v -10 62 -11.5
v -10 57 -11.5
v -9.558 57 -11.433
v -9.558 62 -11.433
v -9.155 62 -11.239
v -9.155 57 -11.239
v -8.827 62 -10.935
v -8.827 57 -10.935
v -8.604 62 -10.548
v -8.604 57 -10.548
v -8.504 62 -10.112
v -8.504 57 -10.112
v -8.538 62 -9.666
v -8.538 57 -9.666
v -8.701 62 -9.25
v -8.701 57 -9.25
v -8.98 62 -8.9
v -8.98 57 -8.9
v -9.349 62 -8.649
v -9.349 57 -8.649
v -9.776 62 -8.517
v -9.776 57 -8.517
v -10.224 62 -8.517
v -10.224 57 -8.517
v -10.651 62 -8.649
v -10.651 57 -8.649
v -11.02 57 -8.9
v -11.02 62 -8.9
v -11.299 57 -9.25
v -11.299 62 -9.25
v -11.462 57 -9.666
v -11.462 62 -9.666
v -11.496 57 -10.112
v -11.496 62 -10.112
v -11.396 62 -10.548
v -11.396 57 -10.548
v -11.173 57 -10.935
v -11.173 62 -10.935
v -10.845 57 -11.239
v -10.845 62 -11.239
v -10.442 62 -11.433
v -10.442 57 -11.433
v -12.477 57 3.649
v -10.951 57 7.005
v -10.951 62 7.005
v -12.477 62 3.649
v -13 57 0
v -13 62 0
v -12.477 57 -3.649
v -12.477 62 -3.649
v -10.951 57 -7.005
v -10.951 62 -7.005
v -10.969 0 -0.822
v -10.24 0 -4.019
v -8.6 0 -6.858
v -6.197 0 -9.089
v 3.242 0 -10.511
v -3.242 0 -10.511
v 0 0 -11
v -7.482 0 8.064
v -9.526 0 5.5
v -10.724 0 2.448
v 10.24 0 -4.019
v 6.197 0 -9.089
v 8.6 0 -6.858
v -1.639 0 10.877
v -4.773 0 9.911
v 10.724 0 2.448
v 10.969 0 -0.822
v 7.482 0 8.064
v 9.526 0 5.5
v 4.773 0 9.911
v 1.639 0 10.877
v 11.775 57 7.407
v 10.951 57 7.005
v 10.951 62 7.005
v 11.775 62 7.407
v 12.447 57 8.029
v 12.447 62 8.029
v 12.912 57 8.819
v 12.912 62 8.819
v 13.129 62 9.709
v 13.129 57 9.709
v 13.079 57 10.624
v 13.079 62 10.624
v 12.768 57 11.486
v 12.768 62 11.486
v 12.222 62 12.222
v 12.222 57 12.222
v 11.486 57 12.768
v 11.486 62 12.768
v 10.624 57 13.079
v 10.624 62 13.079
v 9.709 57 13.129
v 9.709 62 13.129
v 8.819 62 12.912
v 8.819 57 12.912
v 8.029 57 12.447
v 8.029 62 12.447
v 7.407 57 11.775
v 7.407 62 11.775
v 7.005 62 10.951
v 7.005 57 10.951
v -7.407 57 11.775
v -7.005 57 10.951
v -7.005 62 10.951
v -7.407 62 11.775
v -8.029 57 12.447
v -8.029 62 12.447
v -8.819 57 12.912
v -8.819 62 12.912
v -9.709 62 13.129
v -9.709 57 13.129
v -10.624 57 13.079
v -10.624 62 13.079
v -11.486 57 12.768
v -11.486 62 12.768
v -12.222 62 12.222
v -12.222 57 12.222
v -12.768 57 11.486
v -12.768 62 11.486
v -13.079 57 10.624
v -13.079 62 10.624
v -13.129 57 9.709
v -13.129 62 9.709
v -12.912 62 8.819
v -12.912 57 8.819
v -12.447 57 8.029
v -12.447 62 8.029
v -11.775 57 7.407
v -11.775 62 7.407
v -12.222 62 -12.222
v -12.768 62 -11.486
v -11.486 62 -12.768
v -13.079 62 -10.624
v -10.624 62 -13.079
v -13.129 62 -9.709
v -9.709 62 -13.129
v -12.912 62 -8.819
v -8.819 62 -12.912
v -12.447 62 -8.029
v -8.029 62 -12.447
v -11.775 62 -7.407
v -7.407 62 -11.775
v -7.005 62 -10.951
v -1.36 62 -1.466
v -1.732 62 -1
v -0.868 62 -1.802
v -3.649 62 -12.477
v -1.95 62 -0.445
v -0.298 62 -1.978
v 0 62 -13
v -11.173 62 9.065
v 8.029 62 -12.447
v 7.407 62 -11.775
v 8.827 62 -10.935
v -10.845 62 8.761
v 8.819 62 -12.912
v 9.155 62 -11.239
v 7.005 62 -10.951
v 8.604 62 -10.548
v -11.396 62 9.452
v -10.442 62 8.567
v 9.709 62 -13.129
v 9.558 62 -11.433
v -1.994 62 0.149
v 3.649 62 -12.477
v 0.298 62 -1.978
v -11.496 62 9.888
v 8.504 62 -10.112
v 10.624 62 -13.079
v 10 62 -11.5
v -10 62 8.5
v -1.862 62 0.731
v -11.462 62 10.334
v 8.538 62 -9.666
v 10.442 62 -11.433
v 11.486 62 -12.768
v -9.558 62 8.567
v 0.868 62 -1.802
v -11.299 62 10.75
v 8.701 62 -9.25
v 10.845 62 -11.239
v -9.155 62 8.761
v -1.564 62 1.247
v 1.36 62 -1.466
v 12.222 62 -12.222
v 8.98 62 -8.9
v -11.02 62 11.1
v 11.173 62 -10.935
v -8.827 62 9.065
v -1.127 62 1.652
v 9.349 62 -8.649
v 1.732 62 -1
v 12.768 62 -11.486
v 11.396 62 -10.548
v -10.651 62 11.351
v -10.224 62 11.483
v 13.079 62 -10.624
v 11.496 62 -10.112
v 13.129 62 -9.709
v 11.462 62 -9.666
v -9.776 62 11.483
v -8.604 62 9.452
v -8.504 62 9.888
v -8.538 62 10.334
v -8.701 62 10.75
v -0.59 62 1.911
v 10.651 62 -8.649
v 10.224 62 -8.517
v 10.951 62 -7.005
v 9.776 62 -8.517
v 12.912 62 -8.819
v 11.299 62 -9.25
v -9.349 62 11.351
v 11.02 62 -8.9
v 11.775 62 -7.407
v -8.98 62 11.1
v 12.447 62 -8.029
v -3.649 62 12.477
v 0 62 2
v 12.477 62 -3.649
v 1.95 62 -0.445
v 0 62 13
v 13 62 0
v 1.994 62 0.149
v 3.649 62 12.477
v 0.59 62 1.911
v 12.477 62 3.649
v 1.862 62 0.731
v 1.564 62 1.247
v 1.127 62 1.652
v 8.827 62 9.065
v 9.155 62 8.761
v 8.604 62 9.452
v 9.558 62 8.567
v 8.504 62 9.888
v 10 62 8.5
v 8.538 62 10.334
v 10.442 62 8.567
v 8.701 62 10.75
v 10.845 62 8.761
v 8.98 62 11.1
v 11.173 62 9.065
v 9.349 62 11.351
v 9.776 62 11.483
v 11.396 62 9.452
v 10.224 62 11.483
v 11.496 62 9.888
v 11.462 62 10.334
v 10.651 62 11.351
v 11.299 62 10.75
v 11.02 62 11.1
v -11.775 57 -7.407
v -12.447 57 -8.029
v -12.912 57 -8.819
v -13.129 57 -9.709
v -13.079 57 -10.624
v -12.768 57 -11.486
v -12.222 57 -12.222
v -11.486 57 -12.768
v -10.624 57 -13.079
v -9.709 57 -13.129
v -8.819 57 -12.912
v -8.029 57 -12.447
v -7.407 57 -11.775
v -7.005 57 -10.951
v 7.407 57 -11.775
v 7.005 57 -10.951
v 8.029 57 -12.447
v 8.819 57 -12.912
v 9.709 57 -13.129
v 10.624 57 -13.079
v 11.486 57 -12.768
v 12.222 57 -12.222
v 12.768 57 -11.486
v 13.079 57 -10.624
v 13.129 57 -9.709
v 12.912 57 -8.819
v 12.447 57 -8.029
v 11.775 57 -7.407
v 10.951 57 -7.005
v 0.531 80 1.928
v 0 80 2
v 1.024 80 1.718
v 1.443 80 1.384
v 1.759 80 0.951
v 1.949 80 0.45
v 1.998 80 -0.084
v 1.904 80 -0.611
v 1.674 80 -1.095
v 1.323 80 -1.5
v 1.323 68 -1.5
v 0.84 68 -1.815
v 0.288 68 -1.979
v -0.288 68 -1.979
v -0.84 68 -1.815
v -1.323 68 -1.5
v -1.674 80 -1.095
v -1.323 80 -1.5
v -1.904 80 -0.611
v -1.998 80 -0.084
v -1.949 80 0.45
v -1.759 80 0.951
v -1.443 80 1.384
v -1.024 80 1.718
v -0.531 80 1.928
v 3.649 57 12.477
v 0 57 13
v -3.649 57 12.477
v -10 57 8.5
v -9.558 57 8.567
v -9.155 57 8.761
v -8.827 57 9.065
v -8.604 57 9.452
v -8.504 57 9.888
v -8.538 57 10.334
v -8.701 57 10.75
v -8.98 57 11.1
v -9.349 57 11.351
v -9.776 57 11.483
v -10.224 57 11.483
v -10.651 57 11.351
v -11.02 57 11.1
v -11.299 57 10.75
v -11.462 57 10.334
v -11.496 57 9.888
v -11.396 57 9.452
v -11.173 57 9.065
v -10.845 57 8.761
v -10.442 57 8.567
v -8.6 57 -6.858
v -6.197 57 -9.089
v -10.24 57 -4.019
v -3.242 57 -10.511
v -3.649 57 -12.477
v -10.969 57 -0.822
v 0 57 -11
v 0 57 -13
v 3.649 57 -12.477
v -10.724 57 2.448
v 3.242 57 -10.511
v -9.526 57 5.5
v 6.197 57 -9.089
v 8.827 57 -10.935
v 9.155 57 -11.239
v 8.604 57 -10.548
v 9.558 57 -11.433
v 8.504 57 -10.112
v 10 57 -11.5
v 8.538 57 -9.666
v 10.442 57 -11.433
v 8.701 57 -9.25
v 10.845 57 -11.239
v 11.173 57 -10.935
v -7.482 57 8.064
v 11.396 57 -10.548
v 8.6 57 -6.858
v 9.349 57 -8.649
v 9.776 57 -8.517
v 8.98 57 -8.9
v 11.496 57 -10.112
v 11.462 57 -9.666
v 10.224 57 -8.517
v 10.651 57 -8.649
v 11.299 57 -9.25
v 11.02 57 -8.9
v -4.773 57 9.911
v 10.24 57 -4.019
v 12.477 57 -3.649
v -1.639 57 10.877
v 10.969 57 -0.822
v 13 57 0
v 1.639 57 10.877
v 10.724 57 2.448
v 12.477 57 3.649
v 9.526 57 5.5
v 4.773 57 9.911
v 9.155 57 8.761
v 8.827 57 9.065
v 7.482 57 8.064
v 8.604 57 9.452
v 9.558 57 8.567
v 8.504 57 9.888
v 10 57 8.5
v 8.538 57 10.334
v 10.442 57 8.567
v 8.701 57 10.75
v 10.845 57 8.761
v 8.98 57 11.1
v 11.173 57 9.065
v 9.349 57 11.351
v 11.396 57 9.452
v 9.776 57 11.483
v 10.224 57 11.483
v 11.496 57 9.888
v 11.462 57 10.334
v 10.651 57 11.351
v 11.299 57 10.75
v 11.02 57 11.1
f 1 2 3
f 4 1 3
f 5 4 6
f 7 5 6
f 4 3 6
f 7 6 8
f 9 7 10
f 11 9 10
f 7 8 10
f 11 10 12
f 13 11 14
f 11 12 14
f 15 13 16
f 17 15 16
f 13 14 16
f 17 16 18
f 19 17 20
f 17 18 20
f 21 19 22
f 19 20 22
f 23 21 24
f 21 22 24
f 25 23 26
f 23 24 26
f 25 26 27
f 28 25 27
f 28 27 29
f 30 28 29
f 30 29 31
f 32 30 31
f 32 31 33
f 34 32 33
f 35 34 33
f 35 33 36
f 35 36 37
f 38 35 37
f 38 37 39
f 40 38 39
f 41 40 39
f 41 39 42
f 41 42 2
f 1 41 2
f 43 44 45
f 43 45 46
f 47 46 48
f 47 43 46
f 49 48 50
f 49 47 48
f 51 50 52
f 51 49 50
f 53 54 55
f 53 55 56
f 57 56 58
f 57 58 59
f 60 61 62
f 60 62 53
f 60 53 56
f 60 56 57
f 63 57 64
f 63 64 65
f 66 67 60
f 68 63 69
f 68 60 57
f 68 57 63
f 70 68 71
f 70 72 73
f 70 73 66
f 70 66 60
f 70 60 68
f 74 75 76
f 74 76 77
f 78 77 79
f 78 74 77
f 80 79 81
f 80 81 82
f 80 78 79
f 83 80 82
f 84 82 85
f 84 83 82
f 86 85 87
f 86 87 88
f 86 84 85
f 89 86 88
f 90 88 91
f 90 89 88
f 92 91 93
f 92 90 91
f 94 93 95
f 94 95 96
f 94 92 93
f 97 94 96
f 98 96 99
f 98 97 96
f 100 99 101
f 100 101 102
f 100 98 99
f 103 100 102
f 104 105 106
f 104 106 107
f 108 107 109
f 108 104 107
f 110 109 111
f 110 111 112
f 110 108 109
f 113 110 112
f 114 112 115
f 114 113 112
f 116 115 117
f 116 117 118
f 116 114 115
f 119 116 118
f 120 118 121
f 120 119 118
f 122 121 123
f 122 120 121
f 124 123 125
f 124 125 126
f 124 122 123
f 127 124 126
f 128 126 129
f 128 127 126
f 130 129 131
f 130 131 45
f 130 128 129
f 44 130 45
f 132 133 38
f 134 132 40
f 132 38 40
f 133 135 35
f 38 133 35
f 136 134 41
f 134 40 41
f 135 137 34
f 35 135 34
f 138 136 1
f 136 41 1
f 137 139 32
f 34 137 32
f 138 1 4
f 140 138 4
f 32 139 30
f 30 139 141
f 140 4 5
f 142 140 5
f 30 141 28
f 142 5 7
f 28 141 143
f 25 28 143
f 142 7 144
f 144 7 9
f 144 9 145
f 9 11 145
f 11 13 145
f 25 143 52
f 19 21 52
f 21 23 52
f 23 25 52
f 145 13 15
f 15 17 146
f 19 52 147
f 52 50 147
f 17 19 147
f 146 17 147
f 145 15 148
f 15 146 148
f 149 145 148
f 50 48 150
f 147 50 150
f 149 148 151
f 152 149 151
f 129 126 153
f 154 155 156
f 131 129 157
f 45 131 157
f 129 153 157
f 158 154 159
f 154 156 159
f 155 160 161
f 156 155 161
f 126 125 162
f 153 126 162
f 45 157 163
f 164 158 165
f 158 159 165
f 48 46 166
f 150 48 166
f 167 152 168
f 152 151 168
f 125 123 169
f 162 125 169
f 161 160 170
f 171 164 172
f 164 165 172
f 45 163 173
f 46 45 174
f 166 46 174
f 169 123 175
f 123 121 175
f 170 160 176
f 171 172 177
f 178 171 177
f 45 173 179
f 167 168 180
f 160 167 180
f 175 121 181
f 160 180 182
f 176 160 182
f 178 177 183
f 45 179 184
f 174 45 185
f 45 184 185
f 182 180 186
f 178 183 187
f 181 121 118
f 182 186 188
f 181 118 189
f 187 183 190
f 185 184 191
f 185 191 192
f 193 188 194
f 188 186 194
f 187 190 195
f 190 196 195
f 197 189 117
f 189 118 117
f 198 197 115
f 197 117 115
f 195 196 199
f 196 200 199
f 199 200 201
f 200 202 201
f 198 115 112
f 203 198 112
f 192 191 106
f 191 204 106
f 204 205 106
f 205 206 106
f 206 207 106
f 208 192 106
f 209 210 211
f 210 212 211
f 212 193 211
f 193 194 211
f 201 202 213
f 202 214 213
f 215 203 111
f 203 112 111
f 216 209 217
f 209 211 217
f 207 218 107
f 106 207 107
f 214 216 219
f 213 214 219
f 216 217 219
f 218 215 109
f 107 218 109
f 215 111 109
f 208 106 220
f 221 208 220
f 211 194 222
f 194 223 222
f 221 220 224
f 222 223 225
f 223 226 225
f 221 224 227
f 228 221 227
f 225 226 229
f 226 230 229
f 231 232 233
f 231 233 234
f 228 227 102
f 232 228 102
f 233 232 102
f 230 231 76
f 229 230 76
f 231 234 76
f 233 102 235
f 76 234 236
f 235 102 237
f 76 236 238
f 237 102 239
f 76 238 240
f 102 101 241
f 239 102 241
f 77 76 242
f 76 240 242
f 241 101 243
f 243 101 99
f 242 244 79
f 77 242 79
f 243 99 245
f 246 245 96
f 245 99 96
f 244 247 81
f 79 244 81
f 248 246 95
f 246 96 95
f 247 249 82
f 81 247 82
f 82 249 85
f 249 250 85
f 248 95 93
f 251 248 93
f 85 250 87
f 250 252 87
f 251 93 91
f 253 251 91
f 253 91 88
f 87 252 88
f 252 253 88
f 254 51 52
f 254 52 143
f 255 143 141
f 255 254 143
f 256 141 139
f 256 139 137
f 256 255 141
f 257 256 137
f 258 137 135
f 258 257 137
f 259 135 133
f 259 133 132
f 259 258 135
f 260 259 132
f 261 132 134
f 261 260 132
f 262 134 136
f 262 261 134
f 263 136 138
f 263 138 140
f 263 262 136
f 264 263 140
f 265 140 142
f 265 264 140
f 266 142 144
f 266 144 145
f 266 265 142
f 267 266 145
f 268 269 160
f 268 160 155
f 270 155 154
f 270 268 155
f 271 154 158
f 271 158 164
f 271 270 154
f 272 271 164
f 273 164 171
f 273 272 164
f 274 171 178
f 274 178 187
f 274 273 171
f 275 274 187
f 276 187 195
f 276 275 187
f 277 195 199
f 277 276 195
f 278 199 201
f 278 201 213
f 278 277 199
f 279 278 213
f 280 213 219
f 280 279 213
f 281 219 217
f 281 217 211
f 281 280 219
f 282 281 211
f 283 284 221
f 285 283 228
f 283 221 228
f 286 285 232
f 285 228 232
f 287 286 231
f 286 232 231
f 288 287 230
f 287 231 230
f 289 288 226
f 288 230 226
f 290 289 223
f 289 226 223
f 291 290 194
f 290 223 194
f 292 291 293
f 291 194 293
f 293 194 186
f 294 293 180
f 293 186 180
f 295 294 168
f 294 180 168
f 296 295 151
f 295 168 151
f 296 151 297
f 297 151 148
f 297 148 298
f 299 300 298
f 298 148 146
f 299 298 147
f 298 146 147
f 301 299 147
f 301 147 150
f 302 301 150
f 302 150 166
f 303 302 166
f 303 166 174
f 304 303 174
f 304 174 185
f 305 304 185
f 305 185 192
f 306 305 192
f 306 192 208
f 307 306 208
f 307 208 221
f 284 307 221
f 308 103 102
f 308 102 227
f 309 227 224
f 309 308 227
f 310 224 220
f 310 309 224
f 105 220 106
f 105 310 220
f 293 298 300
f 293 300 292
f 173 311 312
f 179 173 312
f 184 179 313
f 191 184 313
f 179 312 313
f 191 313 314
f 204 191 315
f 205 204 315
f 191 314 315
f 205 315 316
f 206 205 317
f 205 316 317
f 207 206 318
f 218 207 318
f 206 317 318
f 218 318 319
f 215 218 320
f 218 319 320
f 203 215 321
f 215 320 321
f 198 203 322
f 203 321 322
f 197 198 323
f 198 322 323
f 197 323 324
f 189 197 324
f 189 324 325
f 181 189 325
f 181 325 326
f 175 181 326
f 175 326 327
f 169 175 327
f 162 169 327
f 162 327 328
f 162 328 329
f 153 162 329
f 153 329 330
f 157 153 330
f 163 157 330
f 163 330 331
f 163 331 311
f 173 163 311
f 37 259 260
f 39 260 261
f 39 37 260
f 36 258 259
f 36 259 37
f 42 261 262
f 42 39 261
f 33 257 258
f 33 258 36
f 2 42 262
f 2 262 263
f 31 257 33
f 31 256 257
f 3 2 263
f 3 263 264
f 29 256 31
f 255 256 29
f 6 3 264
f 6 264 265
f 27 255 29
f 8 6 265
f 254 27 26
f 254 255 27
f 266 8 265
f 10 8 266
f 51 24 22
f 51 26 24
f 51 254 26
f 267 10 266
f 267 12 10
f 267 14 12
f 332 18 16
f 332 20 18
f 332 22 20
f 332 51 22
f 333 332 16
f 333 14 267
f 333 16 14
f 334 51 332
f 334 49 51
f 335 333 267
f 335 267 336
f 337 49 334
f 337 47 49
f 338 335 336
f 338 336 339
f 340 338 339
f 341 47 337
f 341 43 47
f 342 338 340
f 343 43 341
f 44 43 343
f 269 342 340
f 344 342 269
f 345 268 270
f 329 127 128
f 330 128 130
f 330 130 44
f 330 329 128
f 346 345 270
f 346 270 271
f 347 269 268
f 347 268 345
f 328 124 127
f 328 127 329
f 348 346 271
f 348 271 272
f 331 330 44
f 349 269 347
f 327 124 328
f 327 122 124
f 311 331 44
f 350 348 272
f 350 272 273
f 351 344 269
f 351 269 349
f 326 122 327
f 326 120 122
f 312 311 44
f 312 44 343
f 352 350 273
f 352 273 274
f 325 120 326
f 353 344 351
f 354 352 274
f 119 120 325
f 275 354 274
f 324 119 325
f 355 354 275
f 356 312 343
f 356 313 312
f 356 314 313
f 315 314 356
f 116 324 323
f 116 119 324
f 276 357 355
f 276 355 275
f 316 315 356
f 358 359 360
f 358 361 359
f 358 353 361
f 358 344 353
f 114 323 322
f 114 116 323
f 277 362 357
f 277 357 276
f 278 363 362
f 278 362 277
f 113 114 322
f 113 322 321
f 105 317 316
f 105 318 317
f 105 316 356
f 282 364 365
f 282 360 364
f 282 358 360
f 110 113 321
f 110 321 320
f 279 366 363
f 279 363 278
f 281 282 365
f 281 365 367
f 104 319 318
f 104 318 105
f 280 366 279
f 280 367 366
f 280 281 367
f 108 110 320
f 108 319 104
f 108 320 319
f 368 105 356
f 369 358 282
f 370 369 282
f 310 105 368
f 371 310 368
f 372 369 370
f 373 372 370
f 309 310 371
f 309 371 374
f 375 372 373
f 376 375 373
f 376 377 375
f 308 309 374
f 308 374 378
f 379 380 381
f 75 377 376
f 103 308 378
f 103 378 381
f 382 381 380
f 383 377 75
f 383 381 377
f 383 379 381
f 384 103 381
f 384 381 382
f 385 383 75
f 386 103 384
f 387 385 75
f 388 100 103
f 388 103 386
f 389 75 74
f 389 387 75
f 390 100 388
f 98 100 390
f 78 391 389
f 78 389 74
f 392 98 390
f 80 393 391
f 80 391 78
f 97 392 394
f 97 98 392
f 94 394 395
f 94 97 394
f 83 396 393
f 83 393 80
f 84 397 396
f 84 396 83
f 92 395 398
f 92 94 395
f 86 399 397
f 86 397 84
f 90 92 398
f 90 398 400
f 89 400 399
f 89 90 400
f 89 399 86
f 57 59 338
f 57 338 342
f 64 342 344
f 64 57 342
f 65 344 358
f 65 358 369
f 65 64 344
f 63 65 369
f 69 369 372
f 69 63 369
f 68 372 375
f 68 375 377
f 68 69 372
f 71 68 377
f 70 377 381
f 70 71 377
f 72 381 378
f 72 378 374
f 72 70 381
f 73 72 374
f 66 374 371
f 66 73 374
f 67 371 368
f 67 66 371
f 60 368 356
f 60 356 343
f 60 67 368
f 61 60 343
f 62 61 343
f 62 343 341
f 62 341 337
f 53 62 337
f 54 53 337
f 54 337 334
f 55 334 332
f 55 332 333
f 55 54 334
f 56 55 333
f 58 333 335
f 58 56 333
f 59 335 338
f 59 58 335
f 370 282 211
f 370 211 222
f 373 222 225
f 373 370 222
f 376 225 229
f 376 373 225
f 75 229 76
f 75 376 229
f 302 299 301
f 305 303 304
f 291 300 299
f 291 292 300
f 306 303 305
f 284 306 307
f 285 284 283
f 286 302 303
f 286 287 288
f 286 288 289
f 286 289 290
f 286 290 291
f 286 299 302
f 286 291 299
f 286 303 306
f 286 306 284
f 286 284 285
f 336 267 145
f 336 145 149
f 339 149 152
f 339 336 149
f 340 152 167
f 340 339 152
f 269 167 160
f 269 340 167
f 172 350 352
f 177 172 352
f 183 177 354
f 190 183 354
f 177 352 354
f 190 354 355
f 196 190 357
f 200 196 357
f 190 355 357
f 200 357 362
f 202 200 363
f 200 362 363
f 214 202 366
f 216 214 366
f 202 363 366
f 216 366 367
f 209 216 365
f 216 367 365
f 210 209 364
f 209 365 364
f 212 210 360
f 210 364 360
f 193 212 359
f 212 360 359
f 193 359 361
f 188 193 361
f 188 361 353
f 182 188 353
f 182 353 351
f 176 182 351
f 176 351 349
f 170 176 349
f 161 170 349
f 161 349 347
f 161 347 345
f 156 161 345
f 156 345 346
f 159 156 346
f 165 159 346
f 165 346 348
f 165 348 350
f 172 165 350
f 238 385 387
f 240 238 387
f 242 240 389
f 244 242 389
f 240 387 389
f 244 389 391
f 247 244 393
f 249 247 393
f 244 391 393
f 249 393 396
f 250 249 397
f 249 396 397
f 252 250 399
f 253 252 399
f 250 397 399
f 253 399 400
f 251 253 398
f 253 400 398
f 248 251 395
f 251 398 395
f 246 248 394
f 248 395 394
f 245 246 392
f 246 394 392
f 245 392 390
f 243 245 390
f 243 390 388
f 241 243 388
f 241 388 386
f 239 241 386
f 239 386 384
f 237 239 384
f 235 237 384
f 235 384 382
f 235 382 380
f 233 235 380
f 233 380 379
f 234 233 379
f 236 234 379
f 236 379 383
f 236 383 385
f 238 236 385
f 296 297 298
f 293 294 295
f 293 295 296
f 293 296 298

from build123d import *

# Parameters (mm, degrees)
SKETCH1_R      = 11
EXTRUDE1_DEPTH = 62
SKETCH2_R      = 2
EXTRUDE2_DEPTH = 18
SKETCH3_R      = 1.5
SKETCH3_R_2    = 11
EXTRUDE3_DEPTH = 62
SKETCH4_R      = 20.921238725
SKETCH4_R_2    = 11
EXTRUDE4_DEPTH = 57
EXTRUDE5_START = -12
EXTRUDE5_DEPTH = 12


with BuildPart() as part:
    # Sketch1 → Extrude1 (new body)
    with BuildSketch(Plane(origin=(0, 0, 0), x_dir=(1, 0, 0), z_dir=(0, 1, 0))):
        with Locations(Location((0, 0, 0), (0, 0, 270))):
            Circle(SKETCH1_R)
    extrude(amount=EXTRUDE1_DEPTH)

    # Sketch2 → Extrude2 (add)
    with BuildSketch(Plane(origin=(0, 62, 0), x_dir=(1, 0, 0), z_dir=(0, 1, 0))):
        with Locations(Location((0, 0, 0), (0, 0, 270))):
            Circle(SKETCH2_R)
    extrude(amount=EXTRUDE2_DEPTH)

    # Sketch3 → Extrude3 (add)
    with BuildSketch(Plane.XZ):
        with BuildLine():
            ThreePointArc((10.951086395, -7.005262792), (13, 0), (10.951086395, 7.005262792))
            ThreePointArc((10.951086395, 7.005262792), (12.221825407, 12.221825407), (7.005262792, 10.951086395))
            ThreePointArc((7.005262792, 10.951086395), (0, 13), (-7.005262792, 10.951086395))
            ThreePointArc((-7.005262792, 10.951086395), (-12.221825407, 12.221825407), (-10.951086395, 7.005262792))
            ThreePointArc((-10.951086395, 7.005262792), (-13, 0), (-10.951086395, -7.005262792))
            ThreePointArc((-10.951086395, -7.005262792), (-12.221825407, -12.221825407), (-7.005262792, -10.951086395))
            ThreePointArc((-7.005262792, -10.951086395), (0, -13), (7.005262792, -10.951086395))
            ThreePointArc((7.005262792, -10.951086395), (12.221825407, -12.221825407), (10.951086395, -7.005262792))
        make_face()
        with Locations(Location((10, -10, 0), (0, 0, 270))):
            Circle(SKETCH3_R, mode=Mode.SUBTRACT)
        with Locations(Location((10, 10, 0), (0, 0, 270))):
            Circle(SKETCH3_R, mode=Mode.SUBTRACT)
        with Locations(Location((-10, 10, 0), (0, 0, 270))):
            Circle(SKETCH3_R, mode=Mode.SUBTRACT)
        with Locations(Location((-10, -10, 0), (0, 0, 270))):
            Circle(SKETCH3_R, mode=Mode.SUBTRACT)
        Circle(SKETCH3_R_2, mode=Mode.SUBTRACT)
    extrude(amount=-EXTRUDE3_DEPTH)

    # Sketch4 → Extrude4 (cut)
    with BuildSketch(Plane.XZ):
        Circle(SKETCH4_R)
        with Locations(Location((0, 0, 0), (0, 0, 270))):
            Circle(SKETCH4_R_2, mode=Mode.SUBTRACT)
    extrude(amount=-EXTRUDE4_DEPTH, mode=Mode.SUBTRACT)

    # Sketch5 → Extrude5 (cut)
    with BuildSketch(Plane(origin=(0, 80, 0), x_dir=(1, 0, 0), z_dir=(0, 1, 0)).offset(EXTRUDE5_START)):
        with BuildLine():
            Line((-1.322875656, 1.5), (1.322875656, 1.5))
            ThreePointArc((1.322875656, 1.5), (0, 2), (-1.322875656, 1.5))
        make_face()
    extrude(amount=EXTRUDE5_DEPTH, mode=Mode.SUBTRACT)


solid = part.part
